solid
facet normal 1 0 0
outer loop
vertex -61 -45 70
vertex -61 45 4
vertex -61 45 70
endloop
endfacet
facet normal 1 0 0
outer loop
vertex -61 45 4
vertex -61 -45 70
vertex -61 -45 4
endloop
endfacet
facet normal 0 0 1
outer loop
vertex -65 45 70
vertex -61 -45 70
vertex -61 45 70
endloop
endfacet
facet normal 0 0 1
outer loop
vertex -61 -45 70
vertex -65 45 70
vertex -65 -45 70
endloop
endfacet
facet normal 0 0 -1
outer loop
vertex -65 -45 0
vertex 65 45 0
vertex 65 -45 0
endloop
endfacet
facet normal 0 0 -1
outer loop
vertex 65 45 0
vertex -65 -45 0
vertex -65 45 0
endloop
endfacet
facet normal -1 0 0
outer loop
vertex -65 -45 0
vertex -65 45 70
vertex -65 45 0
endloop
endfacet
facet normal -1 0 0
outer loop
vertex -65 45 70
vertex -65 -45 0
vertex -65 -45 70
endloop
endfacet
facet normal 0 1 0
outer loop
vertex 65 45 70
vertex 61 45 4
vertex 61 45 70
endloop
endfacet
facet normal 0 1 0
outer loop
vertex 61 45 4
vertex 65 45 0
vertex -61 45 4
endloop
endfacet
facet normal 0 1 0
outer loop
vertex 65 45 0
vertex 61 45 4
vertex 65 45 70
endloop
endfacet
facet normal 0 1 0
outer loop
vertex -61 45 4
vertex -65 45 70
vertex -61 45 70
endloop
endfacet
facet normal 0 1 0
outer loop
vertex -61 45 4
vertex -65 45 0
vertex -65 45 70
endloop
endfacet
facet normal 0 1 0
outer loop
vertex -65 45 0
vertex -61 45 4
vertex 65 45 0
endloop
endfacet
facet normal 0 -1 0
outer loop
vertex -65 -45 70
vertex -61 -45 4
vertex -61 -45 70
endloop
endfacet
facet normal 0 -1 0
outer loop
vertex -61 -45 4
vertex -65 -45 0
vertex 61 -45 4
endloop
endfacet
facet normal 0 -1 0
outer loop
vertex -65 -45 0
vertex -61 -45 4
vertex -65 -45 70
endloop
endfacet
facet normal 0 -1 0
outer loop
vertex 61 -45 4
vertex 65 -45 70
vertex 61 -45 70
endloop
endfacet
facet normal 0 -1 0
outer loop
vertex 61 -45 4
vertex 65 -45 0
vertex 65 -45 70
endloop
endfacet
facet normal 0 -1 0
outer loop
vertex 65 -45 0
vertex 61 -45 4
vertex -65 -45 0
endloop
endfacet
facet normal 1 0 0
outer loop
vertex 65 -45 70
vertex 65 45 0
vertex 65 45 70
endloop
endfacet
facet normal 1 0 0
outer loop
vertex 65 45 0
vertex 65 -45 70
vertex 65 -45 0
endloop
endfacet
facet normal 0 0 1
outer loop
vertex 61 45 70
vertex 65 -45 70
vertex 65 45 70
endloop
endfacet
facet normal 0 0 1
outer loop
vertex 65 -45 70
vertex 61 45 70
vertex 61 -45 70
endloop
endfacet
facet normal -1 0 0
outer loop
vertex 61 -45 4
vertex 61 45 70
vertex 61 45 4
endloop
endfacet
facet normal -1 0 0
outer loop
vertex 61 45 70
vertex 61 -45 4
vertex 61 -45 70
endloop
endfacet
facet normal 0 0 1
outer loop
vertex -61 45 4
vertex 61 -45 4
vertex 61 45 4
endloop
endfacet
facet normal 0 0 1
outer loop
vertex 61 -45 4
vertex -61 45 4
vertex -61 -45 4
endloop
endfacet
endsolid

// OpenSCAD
// Rack for six 50 mL conical (Falcon-type) tubes
// Print orientation: flat plate on bed, walls rising above it.
// After printing, flip the part so the walls stand on the bed and the
// tube holes face upward.
//
// Units: mm. $fn = 64 for round holes.

// ---------------- Parameters ----------------
plate_x      = 130;   // plate length along X
plate_y      = 90;    // plate width along Y
plate_t      = 4;     // plate thickness (z = 0 to 4)

hole_d       = 30.5;  // through-hole diameter
hole_count   = 6;     // number of tube holes
hole_pitch   = 40;    // centre-to-centre spacing (both X and Y)
hole_start_x = -65;   // first hole X (3 holes over 130 mm)
hole_start_y = -45;   // first hole Y (2 rows along Y)

wall_t       = 4;     // wall thickness (Y)
wall_h       = 70;    // wall height from bed (z = 0 to 70)

eps          = 0.5;   // cutter overshoot past faces

$fn = 64;

// ---------------- Model ----------------
union() {
    // Flat base plate
    translate([-plate_x/2, -plate_y/2, 0])
        cube([plate_x, plate_y, plate_t]);

    // Two solid walls along the long edges (flush with plate's long edge)
    for (sx = [-1, 1])
        translate([sx > 0 ? plate_x/2 - wall_t : -plate_x/2,
                   -plate_y/2, 0])
            cube([wall_t, plate_y, wall_h]);
}

// ---------------- Tube holes ----------------
// Drilled while in print orientation; after flipping they face upward.
difference() {
    // (Copy of the rack body to keep a clean module structure)
    union() {
        translate([-plate_x/2, -plate_y/2, 0])
            cube([plate_x, plate_y, plate_t]);
        for (sx = [-1, 1])
            translate([sx > 0 ? plate_x/2 - wall_t : -plate_x/2,
                       -plate_y/2, 0])
                cube([wall_t, plate_y, wall_h]);
    }

    for (i = [0 : hole_count - 1]) {
        x = hole_start_x + i % 3 * hole_pitch;
        y = hole_start_y + floor(i / 3) * hole_pitch;
        translate([x, y, -eps])
            cylinder(d = hole_d, h = plate_t + 2*eps);
    }
}
